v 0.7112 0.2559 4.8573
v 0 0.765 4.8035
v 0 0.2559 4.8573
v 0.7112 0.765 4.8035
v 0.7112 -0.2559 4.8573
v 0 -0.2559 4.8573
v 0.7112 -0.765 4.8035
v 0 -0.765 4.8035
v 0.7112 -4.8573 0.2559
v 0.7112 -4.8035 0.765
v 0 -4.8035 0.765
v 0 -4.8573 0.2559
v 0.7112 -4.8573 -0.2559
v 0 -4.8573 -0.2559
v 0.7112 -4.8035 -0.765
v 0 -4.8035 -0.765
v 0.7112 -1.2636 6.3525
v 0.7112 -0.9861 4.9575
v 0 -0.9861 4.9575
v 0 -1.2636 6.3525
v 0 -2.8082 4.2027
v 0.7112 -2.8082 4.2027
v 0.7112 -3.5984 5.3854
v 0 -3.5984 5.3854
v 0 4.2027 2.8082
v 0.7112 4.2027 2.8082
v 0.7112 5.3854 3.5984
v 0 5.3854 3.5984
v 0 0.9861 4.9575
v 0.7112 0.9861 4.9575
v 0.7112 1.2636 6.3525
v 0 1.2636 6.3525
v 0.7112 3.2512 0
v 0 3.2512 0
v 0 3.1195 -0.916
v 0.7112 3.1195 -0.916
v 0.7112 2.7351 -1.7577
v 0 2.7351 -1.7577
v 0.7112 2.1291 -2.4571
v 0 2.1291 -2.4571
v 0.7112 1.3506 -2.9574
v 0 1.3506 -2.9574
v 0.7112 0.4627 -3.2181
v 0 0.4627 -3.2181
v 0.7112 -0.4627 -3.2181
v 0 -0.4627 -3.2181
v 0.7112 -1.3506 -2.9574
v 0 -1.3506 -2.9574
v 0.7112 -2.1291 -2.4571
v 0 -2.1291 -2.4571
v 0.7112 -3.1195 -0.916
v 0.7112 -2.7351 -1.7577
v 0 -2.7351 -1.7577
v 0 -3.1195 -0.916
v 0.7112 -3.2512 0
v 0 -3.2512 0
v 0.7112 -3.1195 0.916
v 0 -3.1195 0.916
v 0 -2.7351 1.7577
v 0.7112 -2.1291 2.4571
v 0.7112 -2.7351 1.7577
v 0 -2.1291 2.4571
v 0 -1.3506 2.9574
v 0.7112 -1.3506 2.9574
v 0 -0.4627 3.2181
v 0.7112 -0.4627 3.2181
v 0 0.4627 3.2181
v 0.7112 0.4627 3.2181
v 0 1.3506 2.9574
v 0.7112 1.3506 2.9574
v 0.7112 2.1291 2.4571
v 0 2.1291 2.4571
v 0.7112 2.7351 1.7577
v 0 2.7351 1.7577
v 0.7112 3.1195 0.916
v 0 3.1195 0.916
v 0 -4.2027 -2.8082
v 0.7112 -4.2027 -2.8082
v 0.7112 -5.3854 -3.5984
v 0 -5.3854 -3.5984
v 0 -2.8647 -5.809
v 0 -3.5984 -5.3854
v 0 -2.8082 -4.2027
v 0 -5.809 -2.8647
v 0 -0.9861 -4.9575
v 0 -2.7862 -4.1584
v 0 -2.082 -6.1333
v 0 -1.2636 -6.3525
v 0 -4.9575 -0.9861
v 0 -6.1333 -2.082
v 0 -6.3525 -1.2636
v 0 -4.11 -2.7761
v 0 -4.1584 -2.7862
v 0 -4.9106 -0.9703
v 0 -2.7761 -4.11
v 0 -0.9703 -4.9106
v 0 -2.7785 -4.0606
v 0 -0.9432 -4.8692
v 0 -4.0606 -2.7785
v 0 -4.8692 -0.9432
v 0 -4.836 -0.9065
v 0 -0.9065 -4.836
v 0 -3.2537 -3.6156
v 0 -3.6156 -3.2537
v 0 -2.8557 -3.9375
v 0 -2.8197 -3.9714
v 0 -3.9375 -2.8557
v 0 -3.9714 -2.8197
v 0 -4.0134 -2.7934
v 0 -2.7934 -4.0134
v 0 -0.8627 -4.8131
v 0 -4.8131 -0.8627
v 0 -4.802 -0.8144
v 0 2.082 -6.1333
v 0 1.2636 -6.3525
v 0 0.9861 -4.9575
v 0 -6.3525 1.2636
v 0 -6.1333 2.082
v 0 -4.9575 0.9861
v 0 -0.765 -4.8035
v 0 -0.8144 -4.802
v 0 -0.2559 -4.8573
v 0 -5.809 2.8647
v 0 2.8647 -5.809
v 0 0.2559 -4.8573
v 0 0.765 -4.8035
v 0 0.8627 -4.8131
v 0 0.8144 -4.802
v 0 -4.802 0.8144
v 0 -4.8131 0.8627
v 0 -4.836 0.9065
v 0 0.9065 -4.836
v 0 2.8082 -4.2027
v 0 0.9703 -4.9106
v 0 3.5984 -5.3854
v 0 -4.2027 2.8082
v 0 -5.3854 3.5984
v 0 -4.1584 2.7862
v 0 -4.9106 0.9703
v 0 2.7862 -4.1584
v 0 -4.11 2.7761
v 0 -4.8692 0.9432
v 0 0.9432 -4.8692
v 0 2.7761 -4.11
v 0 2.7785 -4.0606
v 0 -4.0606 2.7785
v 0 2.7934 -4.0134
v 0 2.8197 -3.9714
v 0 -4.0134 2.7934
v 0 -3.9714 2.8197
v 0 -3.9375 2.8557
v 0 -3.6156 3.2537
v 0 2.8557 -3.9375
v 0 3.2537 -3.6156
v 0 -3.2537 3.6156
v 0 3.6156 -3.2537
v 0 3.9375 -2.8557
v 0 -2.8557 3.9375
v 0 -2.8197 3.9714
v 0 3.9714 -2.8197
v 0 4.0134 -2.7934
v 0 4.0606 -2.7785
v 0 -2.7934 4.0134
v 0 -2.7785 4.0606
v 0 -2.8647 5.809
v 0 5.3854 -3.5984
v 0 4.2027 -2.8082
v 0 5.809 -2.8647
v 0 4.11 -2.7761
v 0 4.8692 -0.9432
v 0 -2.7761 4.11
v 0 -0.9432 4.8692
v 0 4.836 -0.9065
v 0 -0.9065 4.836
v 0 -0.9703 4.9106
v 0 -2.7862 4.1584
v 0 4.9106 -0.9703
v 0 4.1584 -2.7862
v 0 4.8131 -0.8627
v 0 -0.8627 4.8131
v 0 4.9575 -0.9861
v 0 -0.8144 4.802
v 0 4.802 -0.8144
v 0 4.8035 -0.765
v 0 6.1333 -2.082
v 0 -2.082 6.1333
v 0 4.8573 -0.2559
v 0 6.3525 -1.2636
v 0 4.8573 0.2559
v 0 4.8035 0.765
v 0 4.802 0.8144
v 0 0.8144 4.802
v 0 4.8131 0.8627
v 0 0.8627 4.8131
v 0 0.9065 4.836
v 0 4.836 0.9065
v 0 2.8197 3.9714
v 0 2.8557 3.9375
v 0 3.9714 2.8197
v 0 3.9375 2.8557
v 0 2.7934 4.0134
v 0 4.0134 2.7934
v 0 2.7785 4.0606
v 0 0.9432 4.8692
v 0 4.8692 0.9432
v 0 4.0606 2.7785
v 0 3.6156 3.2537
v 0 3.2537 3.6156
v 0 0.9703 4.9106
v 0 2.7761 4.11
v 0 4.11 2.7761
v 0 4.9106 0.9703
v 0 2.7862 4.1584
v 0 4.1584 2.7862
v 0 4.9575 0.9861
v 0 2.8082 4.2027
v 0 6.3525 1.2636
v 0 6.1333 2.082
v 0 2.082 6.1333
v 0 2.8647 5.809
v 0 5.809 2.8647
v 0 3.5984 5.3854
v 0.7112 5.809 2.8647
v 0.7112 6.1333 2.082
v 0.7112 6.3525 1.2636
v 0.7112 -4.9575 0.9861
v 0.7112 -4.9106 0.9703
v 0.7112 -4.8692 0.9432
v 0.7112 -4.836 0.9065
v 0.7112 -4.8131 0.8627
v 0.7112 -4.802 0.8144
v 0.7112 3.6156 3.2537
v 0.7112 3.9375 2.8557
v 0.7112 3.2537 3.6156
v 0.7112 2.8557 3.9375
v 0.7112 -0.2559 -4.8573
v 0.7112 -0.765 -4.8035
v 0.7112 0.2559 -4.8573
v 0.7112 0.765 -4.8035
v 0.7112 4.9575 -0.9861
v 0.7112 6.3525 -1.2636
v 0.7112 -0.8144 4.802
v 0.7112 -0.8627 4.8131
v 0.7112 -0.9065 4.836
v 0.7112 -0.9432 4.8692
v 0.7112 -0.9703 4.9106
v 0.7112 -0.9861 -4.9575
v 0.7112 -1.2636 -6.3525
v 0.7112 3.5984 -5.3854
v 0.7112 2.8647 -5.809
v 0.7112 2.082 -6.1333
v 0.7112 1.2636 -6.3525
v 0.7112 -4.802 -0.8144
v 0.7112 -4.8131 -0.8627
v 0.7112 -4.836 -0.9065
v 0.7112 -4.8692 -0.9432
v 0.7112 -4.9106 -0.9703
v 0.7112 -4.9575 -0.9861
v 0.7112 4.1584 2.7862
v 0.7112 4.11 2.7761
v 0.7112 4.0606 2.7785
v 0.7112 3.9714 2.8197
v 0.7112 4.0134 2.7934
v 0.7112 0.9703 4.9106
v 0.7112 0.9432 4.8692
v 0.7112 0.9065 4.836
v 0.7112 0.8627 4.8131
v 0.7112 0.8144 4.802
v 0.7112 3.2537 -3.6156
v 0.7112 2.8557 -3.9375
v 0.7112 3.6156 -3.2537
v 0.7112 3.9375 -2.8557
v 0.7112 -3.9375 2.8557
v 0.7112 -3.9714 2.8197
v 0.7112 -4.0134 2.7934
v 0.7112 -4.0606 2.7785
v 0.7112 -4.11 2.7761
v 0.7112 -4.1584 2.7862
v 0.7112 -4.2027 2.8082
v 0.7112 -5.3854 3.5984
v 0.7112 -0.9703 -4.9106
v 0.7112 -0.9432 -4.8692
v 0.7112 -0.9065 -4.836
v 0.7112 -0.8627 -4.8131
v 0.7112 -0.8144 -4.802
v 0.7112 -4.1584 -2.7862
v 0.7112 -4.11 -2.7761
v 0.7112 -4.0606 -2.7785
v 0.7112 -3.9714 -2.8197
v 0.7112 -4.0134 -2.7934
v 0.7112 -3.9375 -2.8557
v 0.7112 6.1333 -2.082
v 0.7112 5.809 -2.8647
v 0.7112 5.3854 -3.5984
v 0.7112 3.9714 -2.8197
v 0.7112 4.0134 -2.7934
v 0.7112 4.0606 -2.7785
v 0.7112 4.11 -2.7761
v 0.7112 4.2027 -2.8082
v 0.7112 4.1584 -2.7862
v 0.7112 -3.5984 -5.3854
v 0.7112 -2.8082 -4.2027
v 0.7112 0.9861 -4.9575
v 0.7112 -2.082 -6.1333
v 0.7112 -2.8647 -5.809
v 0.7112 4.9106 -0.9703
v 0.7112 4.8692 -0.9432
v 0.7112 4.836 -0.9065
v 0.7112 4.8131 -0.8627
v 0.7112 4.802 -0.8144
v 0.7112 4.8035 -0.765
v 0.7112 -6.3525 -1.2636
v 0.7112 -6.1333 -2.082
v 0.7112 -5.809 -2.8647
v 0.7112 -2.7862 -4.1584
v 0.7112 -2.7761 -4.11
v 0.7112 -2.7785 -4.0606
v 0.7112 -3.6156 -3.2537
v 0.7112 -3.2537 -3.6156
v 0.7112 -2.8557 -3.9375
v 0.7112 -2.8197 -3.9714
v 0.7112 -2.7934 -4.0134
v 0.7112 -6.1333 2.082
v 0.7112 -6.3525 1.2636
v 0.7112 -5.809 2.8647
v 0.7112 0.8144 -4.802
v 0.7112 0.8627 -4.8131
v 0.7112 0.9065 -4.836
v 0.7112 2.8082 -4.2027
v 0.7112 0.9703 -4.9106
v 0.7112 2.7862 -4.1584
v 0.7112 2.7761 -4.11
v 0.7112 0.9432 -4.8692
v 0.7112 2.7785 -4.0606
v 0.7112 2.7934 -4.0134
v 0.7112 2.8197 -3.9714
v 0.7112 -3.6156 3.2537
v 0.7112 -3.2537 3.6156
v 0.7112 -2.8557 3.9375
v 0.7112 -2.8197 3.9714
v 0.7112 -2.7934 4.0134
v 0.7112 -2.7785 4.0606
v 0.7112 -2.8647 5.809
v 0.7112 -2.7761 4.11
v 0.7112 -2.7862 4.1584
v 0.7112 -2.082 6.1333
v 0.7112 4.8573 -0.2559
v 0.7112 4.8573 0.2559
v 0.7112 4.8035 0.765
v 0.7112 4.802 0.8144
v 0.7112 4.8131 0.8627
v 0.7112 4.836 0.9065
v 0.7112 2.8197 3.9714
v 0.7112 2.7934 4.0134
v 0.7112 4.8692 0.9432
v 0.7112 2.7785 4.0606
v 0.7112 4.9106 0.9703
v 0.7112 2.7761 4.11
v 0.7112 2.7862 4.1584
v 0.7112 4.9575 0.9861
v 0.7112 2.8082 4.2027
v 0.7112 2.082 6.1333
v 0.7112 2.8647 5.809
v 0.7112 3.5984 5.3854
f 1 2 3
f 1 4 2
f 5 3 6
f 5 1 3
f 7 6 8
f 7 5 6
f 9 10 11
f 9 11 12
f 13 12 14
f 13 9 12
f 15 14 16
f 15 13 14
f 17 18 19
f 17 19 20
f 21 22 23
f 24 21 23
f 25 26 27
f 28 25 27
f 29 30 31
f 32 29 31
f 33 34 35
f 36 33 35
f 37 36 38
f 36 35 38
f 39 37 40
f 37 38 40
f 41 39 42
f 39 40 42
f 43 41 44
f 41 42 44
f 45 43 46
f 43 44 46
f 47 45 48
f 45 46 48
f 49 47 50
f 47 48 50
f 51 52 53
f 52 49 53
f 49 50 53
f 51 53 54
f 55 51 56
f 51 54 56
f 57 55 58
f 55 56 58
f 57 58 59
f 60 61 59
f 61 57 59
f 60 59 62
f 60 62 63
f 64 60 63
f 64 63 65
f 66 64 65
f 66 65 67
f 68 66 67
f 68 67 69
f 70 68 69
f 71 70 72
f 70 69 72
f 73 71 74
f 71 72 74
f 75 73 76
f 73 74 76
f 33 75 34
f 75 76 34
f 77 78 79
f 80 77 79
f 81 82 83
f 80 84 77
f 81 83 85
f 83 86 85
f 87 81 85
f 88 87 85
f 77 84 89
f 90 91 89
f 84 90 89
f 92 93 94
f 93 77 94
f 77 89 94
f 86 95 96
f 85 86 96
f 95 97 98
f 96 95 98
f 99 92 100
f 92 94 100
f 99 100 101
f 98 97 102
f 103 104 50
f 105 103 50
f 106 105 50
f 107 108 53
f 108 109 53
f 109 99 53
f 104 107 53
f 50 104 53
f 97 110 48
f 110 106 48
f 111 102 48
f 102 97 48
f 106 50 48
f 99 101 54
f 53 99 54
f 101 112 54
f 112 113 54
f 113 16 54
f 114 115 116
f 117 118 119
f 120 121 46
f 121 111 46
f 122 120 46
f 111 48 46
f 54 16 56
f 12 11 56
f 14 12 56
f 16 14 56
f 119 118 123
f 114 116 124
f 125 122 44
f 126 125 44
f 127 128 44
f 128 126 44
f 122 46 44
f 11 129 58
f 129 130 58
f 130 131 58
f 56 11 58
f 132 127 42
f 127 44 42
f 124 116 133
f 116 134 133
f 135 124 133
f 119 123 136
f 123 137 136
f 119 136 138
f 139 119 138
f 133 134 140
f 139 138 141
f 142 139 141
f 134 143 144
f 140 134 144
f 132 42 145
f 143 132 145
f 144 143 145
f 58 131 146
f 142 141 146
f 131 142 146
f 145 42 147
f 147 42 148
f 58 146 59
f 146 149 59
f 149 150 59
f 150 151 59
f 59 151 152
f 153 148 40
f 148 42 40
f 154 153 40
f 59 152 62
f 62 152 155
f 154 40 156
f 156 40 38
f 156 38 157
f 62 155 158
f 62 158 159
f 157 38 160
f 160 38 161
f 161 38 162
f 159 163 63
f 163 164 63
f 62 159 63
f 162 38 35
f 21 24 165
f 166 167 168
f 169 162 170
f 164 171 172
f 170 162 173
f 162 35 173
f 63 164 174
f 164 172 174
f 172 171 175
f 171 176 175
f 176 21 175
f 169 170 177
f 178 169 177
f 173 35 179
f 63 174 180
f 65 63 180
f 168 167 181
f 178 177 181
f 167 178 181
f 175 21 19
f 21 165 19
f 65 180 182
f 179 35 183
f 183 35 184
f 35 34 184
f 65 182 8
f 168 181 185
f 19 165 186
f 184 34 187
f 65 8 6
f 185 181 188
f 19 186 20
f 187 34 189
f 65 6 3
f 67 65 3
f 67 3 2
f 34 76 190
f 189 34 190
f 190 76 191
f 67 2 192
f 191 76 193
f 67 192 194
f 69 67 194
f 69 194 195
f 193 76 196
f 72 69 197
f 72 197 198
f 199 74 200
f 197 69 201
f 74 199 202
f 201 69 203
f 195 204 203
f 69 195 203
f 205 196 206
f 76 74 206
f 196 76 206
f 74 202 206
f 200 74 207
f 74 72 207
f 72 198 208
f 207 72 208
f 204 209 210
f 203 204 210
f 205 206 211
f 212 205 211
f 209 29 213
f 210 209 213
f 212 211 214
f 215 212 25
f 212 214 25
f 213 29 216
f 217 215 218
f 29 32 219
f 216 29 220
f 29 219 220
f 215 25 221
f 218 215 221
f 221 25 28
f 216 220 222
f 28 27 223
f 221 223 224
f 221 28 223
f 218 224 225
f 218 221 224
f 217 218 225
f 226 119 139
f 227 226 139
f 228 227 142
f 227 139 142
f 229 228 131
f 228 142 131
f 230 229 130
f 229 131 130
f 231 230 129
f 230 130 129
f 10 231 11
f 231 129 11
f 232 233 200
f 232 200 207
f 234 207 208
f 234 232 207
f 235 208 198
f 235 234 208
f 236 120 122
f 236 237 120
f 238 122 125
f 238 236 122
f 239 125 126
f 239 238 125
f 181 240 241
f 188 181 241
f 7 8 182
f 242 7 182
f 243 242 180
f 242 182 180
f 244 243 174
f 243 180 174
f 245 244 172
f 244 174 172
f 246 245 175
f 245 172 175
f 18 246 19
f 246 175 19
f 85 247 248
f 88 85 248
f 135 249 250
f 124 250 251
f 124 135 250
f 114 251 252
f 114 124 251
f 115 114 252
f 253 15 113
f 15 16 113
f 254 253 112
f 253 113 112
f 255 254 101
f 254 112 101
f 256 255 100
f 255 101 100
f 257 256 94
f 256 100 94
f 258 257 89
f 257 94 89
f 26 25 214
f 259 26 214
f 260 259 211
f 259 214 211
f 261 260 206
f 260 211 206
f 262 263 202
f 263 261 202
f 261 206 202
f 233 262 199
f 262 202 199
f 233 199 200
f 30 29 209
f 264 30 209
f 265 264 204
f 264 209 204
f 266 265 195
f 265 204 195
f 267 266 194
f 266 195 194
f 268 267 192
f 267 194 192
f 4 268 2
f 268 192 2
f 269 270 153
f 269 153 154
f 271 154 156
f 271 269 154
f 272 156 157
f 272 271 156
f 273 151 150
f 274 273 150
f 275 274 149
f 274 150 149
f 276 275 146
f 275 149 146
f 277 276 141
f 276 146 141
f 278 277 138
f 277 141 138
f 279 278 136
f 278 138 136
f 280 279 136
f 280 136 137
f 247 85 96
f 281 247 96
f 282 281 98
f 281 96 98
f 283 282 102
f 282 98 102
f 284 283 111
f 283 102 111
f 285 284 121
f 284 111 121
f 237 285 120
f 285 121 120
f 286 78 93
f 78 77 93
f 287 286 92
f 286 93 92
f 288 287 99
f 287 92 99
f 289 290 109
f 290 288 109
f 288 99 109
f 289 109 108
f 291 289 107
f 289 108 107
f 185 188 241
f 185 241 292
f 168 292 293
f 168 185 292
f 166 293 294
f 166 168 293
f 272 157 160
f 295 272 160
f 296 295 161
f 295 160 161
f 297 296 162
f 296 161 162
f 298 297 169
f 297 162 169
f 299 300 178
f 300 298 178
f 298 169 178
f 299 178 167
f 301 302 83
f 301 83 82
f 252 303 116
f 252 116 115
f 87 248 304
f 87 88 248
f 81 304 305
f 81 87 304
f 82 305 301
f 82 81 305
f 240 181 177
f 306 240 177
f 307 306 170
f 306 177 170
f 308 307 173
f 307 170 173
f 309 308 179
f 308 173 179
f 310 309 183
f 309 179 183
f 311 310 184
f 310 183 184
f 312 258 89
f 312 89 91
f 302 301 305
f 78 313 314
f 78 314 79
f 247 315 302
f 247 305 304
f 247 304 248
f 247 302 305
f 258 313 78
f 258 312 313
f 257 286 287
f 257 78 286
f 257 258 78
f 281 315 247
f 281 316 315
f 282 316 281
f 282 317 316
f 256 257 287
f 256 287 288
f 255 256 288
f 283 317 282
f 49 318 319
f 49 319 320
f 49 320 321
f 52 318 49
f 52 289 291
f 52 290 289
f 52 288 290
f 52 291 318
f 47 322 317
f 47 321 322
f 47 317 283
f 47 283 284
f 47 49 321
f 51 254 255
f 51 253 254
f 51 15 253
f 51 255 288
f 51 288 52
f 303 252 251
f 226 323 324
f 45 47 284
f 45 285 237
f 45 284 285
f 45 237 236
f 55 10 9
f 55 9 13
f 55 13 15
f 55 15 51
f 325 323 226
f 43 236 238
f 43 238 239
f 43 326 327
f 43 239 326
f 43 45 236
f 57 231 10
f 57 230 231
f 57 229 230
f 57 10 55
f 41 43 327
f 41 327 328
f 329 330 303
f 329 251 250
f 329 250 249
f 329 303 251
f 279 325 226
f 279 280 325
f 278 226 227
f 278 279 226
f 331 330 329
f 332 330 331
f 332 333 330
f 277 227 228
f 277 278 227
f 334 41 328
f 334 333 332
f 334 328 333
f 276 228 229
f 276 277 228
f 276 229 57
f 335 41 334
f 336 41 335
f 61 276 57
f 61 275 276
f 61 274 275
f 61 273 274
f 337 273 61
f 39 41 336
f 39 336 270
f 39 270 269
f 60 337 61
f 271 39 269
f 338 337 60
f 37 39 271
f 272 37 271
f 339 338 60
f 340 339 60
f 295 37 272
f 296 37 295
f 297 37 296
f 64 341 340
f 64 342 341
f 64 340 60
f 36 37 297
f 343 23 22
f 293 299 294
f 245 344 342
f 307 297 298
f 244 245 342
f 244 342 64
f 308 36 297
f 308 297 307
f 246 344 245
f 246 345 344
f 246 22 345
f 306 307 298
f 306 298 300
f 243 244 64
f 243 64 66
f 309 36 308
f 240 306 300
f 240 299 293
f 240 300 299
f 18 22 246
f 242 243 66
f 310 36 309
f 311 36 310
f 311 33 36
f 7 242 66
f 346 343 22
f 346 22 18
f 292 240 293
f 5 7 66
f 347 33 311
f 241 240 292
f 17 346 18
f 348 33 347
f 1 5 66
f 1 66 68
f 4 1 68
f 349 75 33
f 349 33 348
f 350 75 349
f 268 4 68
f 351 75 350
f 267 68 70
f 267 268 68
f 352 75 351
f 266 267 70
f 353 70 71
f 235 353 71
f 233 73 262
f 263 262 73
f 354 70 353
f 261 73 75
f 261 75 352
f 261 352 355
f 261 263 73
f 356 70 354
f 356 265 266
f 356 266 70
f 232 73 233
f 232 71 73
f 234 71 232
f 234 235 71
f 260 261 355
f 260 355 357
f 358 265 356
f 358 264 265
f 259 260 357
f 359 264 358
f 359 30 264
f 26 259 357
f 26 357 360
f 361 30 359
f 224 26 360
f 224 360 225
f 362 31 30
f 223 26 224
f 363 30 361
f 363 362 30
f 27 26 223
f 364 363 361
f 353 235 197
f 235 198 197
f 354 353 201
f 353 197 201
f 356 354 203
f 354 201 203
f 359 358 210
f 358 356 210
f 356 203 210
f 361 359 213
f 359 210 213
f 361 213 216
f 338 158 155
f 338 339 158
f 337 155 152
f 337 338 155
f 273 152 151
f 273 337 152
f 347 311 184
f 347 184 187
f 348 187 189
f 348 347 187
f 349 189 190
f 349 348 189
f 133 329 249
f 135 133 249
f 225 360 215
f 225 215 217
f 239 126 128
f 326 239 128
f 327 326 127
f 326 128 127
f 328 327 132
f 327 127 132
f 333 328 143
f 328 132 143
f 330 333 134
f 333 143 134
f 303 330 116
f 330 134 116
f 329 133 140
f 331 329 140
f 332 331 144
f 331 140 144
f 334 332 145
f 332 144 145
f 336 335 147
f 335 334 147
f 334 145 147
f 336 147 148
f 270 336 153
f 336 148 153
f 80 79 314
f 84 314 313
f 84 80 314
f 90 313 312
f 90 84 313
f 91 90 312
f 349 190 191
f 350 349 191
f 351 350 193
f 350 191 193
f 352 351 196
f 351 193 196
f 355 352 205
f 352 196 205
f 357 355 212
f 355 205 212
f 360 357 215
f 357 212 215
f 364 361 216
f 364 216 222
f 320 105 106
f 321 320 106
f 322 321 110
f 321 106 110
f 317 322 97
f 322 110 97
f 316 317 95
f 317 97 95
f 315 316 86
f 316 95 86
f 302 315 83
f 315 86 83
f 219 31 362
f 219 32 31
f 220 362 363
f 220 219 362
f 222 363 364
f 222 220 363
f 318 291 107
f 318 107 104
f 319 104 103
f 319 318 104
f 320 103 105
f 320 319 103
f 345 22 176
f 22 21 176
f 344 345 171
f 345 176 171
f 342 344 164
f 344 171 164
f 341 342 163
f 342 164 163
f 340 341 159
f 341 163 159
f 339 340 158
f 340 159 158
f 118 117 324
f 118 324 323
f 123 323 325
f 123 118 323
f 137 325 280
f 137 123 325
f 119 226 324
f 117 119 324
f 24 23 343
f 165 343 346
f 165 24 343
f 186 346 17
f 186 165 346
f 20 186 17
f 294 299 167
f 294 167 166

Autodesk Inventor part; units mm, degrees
ref_plane "YZ Plane" through (0, 0, 0) normal (1, 0, 0) x (0, 1, 0)
ref_plane "XZ Plane" through (0, 0, 0) normal (0, 1, 0) x (-1, 0, 0)
ref_plane "XY Plane" through (0, 0, 0) normal (0, 0, 1) x (1, 0, 0)
sketch "Sketch1" plane through (0, 0, 0) normal (1, 0, 0) x (0, 1, 0)
  circle A0 centre (0, 0) radius 6.477
  circle A1 centre (0, 0) radius 3.2512
  dimension "d0" = 12.954
  dimension "d1" = 6.5024
extrude "Body" add sketch "Sketch1" along normal blind 0.7112
sketch "Sketch2" plane through (0.7112, 0, 0) normal (1, 0, 0) x (0, 0, -1)
  circle A0 centre (0, 0) radius 6.477 projected
  line L0 (0, 0) -> (0, 6.477) construction
  arc A1 (1.2636, 6.3525) -> (-1.2636, 6.3525) centre (0, 0) ccw
  arc A2 (0.9489, 4.7706) -> (-0.9489, 4.7706) centre (0, 0) ccw
  line L1 (-0.9489, 4.7706) -> (-1.2636, 6.3525)
  line L2 (0.9489, 4.7706) -> (1.2636, 6.3525)
  line L3 (-0.9489, 4.7706) -> (0, 0) construction
  line L4 (0, 0) -> (0.9489, 4.7706) construction
  dimension "d4" = 22.5
  dimension "d5" = 9.7282
extrude "Cut" cut sketch "Sketch2" against normal through all contours L2 A2 L1 A0 picked at (-0.106, 5.9266)
fillet "Fillet1" radius 0.1943 2 edges at (0.3556, 4.7706, 0.9489) (0.3556, 4.7706, -0.9489)
pattern_circular "Cuts" count 8 over 360 about axis through (0, 0, 0) along (1, 0, 0) of "Cut", "Fillet1"
equation "\"d0\" = SD2"
equation "\"d1\" = SD1"
equation "\"d2\" = SD"
equation "\"d5\" = 0.5 * SD2 + 0.5 * SD1"
equation "\"d6\" = SD"
equation "\"d8\" = 0.015 * SD2"
equation "\"SD\" = 0.7112"
equation "\"SD1\" = 6.5024"
equation "\"SD2\" = 12.954"
equation "\"NND\" = 6.35"
properties part number "ASME B18.21.1 - 1/4. Carbon Steel" material "Steel, Mild"
